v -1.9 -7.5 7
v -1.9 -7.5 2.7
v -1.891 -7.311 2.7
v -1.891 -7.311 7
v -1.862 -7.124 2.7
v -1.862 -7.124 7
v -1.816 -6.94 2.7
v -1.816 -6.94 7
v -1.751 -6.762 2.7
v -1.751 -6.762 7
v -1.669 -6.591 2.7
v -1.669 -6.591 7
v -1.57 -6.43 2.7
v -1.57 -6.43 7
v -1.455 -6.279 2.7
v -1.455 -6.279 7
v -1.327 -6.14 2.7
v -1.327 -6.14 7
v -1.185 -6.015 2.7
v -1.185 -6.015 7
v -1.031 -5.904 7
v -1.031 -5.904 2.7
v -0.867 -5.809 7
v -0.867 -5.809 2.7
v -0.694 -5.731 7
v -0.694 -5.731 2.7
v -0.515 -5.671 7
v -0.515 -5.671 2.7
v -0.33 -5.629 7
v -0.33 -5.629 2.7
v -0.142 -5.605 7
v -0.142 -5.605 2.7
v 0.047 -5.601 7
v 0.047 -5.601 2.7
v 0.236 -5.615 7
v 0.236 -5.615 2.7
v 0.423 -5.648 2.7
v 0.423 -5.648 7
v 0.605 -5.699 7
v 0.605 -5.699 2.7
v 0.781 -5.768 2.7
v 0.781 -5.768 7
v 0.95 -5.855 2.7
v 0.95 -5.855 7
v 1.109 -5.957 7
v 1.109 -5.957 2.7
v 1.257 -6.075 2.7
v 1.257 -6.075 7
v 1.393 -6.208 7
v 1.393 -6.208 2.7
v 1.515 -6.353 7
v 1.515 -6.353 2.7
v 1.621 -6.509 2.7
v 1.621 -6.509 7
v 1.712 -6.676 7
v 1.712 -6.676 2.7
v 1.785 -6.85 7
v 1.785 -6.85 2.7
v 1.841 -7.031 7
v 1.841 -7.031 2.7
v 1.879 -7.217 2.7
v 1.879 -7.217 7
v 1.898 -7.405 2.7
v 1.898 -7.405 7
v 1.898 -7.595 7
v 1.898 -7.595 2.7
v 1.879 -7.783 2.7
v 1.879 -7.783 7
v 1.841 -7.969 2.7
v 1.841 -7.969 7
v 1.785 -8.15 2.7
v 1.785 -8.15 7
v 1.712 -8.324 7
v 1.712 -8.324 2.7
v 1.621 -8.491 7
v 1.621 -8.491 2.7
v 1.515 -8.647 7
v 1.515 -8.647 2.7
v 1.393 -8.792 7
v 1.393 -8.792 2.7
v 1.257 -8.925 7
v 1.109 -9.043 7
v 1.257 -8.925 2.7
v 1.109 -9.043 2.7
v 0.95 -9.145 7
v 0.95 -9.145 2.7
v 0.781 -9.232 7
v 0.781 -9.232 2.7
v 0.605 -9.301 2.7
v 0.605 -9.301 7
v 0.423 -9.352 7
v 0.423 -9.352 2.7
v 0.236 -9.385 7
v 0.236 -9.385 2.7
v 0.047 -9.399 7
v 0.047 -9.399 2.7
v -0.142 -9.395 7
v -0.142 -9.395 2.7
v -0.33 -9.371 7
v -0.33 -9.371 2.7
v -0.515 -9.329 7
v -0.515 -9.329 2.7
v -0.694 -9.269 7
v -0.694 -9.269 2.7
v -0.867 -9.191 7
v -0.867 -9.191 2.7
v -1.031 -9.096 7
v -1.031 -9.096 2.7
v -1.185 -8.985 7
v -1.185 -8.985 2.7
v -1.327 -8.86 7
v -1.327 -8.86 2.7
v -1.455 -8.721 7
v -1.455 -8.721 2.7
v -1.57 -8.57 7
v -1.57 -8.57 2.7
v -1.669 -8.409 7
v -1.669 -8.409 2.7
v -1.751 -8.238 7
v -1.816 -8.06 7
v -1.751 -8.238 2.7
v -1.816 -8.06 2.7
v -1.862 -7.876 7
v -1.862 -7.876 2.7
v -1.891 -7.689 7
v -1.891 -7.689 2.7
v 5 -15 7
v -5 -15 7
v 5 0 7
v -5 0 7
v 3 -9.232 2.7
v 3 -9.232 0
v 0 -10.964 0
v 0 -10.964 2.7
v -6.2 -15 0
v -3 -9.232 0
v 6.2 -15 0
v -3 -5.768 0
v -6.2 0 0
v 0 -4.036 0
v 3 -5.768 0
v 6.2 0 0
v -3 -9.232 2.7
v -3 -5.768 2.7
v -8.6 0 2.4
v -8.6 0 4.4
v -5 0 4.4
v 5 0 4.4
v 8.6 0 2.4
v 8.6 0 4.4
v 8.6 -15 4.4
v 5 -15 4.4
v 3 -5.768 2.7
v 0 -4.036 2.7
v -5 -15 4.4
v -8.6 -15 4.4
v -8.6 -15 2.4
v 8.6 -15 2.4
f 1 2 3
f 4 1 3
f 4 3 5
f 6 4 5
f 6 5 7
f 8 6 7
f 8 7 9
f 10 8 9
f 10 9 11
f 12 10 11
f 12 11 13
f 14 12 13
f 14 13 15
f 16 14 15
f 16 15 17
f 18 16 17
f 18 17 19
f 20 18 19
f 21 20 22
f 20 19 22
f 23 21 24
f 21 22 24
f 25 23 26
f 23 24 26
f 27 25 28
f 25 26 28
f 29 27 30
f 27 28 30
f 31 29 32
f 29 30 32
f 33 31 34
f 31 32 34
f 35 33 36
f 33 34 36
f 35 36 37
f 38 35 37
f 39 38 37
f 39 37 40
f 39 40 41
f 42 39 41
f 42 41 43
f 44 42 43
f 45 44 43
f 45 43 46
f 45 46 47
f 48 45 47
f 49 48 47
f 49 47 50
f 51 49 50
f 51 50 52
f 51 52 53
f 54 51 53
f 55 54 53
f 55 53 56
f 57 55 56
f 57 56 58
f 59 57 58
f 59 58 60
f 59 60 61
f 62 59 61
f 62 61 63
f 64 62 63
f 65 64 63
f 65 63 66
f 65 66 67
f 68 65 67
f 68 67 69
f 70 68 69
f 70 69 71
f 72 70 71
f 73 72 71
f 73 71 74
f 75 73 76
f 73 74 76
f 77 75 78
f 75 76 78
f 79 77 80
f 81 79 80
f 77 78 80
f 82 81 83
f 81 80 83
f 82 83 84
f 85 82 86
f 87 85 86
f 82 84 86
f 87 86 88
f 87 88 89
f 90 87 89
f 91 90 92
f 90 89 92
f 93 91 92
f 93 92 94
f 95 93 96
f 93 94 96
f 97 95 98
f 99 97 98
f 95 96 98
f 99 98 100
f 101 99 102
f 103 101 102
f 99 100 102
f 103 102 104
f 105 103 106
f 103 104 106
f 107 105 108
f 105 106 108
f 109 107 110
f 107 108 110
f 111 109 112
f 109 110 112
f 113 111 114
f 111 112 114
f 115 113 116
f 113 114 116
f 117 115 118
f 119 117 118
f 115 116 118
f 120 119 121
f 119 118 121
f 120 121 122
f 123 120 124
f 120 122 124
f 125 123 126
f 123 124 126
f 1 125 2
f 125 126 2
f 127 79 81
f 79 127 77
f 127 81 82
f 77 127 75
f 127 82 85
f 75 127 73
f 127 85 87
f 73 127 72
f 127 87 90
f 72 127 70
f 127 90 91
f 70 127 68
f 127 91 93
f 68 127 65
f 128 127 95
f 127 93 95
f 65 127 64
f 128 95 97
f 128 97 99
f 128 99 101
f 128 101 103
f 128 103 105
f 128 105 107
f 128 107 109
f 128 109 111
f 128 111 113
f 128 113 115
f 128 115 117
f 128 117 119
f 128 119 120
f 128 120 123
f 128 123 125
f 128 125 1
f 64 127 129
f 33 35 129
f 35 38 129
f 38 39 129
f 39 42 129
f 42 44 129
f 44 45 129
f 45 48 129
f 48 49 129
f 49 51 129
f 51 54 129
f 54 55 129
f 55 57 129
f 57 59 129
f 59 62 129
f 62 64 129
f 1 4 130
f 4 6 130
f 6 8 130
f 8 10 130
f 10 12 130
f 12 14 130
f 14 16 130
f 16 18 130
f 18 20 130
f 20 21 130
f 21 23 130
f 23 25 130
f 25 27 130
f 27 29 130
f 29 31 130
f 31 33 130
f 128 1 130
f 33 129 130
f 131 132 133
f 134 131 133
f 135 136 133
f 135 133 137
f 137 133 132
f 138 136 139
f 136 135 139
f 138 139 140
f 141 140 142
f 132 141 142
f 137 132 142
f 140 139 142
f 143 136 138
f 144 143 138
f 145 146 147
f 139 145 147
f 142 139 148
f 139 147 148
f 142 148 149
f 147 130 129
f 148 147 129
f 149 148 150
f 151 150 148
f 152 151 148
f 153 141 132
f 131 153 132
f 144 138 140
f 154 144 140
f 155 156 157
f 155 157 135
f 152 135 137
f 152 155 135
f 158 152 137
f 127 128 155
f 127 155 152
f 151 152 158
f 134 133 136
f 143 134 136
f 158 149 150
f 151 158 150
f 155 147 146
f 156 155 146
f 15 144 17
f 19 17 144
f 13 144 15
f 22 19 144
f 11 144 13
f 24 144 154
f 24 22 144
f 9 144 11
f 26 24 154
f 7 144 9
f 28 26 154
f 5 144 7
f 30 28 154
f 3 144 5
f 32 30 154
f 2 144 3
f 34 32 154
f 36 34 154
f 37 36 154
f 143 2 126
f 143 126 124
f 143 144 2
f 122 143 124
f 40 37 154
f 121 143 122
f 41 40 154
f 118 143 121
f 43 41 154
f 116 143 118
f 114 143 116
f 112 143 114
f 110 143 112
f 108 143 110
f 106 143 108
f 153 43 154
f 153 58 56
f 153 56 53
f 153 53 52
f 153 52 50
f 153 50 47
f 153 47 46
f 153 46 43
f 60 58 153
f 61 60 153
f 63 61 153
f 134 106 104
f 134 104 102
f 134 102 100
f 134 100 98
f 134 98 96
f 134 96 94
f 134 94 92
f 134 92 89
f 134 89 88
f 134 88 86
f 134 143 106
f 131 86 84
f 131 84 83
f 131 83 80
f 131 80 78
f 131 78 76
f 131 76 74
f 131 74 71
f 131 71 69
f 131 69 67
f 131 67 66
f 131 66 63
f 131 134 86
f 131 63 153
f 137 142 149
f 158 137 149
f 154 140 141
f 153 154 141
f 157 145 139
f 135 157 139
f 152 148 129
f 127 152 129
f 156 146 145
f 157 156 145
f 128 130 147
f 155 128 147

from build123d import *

# Parameters (mm, degrees)
F1_DEPTH = 15
F3_D     = 3.8
F4_R     = 1.9
F5_DEPTH = 2.7


with BuildPart() as f1:
    # F0 (on Front) → F1 (new body)
    with BuildSketch(Plane.XZ):
        Polygon((0, 7), (0, 0), (6.2, 0), (8.6, 2.4), (8.6, 4.4), (5, 4.4), (5, 7), align=None)
        Polygon((-8.6, 4.4), (-8.6, 2.4), (-6.2, 0), (0, 0), (0, 7), (-5, 7), (-5, 4.4), align=None)
    extrude(amount=F1_DEPTH)

    # F3 (through all)
    with Locations(Plane.XY.offset(7)):
        with Locations((0, -7.5)):
            Hole(F3_D / 2)

    # F4 (on face) → F5 (cut)
    with BuildSketch(Plane(origin=(0, 0, 0), x_dir=(1, 0, 0), z_dir=(0, 0, -1))):
        Polygon((-3, 5.7679491924), (0, 4.0358983849), (3, 5.7679491924), (3, 9.2320508076), (0, 10.9641016151), (-3, 9.2320508076), align=None)
        with Locations((0, 7.5)):
            Circle(F4_R, mode=Mode.SUBTRACT)
    extrude(amount=-F5_DEPTH, mode=Mode.SUBTRACT)


solid = f1.part
